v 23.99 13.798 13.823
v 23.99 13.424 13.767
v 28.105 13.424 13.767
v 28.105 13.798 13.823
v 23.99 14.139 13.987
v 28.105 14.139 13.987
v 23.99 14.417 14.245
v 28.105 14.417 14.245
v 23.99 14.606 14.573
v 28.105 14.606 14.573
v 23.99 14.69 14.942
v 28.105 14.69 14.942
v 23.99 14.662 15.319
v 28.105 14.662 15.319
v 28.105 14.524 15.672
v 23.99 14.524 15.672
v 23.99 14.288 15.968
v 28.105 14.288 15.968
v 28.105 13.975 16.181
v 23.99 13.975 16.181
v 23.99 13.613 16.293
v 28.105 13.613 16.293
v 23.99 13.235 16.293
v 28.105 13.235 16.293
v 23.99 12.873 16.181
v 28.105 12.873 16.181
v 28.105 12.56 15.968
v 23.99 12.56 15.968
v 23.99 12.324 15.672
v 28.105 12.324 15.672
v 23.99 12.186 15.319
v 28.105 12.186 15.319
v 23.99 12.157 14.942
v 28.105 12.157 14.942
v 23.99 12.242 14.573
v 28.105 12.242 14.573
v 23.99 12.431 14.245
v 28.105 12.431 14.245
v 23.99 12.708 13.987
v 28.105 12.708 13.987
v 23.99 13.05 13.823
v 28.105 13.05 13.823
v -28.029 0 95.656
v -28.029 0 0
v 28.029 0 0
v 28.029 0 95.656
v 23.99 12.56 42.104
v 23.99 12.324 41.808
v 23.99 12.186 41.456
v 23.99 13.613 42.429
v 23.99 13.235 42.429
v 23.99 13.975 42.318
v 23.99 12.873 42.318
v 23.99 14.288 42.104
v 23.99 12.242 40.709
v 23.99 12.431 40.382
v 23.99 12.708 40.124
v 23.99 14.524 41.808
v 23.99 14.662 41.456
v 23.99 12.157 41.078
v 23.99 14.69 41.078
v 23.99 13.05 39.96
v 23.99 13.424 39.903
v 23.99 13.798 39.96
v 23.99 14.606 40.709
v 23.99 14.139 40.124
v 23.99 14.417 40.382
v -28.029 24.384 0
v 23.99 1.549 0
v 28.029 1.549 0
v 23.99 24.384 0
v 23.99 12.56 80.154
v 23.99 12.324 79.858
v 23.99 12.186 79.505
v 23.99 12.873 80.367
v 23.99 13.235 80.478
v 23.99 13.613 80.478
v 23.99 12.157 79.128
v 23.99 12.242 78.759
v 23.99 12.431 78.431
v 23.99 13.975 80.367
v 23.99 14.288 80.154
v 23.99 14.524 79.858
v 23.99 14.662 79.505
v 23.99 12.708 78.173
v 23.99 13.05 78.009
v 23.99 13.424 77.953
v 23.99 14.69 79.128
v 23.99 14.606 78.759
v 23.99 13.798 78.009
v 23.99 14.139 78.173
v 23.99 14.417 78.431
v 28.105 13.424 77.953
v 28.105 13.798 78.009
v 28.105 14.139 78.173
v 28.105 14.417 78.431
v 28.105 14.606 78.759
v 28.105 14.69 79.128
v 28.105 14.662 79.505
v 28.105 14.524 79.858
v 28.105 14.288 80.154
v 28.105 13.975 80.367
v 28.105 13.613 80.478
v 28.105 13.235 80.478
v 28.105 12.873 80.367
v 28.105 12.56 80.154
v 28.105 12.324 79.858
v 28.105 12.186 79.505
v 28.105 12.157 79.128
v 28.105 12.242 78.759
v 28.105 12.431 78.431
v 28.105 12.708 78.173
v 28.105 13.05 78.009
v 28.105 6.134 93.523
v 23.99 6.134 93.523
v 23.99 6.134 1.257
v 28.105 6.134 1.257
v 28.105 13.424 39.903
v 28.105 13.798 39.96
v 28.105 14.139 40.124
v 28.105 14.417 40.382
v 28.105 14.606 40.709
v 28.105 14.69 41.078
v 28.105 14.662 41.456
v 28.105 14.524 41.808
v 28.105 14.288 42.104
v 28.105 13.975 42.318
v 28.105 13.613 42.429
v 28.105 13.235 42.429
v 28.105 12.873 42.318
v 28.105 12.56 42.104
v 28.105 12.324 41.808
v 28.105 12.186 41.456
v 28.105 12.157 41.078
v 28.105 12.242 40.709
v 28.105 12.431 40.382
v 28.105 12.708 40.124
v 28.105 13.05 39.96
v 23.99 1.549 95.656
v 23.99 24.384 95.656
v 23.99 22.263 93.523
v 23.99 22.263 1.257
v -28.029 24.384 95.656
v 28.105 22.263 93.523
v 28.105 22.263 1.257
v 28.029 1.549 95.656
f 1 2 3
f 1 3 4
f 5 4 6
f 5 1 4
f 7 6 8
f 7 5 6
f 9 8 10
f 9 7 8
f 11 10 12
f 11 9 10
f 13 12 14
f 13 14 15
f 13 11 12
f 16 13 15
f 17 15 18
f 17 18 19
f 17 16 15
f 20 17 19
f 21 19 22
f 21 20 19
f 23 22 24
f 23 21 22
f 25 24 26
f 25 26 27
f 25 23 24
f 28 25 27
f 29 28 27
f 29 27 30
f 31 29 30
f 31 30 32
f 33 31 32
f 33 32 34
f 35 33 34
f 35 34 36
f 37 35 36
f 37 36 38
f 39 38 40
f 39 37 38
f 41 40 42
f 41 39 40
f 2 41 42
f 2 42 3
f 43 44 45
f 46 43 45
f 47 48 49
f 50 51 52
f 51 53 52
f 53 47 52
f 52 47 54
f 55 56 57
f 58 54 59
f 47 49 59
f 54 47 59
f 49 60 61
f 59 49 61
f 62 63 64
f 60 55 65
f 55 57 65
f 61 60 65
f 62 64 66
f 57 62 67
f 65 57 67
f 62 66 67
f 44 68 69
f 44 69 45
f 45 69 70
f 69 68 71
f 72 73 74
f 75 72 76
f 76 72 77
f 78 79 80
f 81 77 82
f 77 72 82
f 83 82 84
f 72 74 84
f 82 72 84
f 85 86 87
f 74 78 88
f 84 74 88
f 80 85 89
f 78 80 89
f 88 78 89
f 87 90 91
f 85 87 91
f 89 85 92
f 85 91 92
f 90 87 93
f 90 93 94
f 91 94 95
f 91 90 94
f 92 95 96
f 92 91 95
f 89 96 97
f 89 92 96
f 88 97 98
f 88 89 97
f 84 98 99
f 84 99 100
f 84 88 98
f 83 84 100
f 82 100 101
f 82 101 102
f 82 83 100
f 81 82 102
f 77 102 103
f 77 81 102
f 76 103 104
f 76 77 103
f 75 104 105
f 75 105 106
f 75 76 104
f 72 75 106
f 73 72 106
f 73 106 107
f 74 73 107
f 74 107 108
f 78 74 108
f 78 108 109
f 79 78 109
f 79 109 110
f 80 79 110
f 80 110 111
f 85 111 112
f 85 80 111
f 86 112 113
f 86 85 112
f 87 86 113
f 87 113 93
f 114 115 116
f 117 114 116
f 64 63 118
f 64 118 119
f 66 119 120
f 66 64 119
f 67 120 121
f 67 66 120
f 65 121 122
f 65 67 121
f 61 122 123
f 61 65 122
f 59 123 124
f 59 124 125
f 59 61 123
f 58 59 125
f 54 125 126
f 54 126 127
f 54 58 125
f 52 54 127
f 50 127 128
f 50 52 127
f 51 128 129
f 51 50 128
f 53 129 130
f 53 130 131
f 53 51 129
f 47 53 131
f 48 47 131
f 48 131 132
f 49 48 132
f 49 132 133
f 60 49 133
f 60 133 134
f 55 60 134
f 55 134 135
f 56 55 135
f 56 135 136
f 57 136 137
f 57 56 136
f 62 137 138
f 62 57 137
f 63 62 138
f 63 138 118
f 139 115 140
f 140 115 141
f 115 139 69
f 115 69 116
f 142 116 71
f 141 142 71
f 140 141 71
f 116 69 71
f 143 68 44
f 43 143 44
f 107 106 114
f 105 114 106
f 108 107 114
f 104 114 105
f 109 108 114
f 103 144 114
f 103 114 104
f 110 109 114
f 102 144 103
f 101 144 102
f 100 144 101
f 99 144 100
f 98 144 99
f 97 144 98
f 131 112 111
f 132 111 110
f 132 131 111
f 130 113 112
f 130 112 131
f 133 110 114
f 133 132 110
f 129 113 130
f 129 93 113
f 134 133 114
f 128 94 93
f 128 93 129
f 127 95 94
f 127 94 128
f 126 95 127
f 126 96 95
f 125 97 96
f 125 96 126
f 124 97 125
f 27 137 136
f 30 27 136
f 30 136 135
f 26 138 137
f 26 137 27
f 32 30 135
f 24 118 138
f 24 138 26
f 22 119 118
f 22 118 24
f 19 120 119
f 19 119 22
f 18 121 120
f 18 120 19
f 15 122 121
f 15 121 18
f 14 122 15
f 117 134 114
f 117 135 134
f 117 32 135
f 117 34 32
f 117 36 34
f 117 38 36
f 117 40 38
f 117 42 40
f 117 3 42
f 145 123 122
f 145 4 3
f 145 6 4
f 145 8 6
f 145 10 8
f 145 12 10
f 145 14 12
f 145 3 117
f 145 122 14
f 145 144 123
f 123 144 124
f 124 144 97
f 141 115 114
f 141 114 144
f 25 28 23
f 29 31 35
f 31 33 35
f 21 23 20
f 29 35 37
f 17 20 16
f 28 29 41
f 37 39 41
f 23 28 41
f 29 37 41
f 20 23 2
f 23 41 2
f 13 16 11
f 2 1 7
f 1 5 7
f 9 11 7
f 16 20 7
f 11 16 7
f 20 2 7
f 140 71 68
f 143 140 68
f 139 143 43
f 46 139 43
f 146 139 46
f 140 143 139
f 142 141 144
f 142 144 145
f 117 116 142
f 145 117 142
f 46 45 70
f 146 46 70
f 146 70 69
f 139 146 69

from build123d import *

# Parameters (mm, degrees)
BOSS_EXTRUDE1_DEPTH = 95.6564
SKETCH2_W           = 92.2655
SKETCH2_H           = 16.129
SKETCH2_R           = 1.27
BOSS_EXTRUDE2_DEPTH = 4.1148


with BuildPart() as part:
    # Sketch1 → Boss-Extrude1 (new body)
    with BuildSketch(Plane.XY):
        Polygon((-28.0289, 0), (28.0289, 0), (28.0289, 1.5494), (23.9903, 1.5494), (23.9903, 24.384), (-28.0289, 24.384), align=None)
    extrude(amount=BOSS_EXTRUDE1_DEPTH)

    # Sketch2 → Boss-Extrude2 (add)
    with BuildSketch(Plane(origin=(23.9903, 0, 0), x_dir=(0, 0, -1), z_dir=(1, 0, 0))):
        with Locations((-47.39005, 14.1986)):
            Rectangle(SKETCH2_W, SKETCH2_H)
        with Locations((-79.2226, 13.4239)):
            Circle(SKETCH2_R, mode=Mode.SUBTRACT)
        with Locations((-41.1734, 13.4239)):
            Circle(SKETCH2_R, mode=Mode.SUBTRACT)
        with Locations((-15.0368, 13.4239)):
            Circle(SKETCH2_R, mode=Mode.SUBTRACT)
    extrude(amount=BOSS_EXTRUDE2_DEPTH)


solid = part.part
